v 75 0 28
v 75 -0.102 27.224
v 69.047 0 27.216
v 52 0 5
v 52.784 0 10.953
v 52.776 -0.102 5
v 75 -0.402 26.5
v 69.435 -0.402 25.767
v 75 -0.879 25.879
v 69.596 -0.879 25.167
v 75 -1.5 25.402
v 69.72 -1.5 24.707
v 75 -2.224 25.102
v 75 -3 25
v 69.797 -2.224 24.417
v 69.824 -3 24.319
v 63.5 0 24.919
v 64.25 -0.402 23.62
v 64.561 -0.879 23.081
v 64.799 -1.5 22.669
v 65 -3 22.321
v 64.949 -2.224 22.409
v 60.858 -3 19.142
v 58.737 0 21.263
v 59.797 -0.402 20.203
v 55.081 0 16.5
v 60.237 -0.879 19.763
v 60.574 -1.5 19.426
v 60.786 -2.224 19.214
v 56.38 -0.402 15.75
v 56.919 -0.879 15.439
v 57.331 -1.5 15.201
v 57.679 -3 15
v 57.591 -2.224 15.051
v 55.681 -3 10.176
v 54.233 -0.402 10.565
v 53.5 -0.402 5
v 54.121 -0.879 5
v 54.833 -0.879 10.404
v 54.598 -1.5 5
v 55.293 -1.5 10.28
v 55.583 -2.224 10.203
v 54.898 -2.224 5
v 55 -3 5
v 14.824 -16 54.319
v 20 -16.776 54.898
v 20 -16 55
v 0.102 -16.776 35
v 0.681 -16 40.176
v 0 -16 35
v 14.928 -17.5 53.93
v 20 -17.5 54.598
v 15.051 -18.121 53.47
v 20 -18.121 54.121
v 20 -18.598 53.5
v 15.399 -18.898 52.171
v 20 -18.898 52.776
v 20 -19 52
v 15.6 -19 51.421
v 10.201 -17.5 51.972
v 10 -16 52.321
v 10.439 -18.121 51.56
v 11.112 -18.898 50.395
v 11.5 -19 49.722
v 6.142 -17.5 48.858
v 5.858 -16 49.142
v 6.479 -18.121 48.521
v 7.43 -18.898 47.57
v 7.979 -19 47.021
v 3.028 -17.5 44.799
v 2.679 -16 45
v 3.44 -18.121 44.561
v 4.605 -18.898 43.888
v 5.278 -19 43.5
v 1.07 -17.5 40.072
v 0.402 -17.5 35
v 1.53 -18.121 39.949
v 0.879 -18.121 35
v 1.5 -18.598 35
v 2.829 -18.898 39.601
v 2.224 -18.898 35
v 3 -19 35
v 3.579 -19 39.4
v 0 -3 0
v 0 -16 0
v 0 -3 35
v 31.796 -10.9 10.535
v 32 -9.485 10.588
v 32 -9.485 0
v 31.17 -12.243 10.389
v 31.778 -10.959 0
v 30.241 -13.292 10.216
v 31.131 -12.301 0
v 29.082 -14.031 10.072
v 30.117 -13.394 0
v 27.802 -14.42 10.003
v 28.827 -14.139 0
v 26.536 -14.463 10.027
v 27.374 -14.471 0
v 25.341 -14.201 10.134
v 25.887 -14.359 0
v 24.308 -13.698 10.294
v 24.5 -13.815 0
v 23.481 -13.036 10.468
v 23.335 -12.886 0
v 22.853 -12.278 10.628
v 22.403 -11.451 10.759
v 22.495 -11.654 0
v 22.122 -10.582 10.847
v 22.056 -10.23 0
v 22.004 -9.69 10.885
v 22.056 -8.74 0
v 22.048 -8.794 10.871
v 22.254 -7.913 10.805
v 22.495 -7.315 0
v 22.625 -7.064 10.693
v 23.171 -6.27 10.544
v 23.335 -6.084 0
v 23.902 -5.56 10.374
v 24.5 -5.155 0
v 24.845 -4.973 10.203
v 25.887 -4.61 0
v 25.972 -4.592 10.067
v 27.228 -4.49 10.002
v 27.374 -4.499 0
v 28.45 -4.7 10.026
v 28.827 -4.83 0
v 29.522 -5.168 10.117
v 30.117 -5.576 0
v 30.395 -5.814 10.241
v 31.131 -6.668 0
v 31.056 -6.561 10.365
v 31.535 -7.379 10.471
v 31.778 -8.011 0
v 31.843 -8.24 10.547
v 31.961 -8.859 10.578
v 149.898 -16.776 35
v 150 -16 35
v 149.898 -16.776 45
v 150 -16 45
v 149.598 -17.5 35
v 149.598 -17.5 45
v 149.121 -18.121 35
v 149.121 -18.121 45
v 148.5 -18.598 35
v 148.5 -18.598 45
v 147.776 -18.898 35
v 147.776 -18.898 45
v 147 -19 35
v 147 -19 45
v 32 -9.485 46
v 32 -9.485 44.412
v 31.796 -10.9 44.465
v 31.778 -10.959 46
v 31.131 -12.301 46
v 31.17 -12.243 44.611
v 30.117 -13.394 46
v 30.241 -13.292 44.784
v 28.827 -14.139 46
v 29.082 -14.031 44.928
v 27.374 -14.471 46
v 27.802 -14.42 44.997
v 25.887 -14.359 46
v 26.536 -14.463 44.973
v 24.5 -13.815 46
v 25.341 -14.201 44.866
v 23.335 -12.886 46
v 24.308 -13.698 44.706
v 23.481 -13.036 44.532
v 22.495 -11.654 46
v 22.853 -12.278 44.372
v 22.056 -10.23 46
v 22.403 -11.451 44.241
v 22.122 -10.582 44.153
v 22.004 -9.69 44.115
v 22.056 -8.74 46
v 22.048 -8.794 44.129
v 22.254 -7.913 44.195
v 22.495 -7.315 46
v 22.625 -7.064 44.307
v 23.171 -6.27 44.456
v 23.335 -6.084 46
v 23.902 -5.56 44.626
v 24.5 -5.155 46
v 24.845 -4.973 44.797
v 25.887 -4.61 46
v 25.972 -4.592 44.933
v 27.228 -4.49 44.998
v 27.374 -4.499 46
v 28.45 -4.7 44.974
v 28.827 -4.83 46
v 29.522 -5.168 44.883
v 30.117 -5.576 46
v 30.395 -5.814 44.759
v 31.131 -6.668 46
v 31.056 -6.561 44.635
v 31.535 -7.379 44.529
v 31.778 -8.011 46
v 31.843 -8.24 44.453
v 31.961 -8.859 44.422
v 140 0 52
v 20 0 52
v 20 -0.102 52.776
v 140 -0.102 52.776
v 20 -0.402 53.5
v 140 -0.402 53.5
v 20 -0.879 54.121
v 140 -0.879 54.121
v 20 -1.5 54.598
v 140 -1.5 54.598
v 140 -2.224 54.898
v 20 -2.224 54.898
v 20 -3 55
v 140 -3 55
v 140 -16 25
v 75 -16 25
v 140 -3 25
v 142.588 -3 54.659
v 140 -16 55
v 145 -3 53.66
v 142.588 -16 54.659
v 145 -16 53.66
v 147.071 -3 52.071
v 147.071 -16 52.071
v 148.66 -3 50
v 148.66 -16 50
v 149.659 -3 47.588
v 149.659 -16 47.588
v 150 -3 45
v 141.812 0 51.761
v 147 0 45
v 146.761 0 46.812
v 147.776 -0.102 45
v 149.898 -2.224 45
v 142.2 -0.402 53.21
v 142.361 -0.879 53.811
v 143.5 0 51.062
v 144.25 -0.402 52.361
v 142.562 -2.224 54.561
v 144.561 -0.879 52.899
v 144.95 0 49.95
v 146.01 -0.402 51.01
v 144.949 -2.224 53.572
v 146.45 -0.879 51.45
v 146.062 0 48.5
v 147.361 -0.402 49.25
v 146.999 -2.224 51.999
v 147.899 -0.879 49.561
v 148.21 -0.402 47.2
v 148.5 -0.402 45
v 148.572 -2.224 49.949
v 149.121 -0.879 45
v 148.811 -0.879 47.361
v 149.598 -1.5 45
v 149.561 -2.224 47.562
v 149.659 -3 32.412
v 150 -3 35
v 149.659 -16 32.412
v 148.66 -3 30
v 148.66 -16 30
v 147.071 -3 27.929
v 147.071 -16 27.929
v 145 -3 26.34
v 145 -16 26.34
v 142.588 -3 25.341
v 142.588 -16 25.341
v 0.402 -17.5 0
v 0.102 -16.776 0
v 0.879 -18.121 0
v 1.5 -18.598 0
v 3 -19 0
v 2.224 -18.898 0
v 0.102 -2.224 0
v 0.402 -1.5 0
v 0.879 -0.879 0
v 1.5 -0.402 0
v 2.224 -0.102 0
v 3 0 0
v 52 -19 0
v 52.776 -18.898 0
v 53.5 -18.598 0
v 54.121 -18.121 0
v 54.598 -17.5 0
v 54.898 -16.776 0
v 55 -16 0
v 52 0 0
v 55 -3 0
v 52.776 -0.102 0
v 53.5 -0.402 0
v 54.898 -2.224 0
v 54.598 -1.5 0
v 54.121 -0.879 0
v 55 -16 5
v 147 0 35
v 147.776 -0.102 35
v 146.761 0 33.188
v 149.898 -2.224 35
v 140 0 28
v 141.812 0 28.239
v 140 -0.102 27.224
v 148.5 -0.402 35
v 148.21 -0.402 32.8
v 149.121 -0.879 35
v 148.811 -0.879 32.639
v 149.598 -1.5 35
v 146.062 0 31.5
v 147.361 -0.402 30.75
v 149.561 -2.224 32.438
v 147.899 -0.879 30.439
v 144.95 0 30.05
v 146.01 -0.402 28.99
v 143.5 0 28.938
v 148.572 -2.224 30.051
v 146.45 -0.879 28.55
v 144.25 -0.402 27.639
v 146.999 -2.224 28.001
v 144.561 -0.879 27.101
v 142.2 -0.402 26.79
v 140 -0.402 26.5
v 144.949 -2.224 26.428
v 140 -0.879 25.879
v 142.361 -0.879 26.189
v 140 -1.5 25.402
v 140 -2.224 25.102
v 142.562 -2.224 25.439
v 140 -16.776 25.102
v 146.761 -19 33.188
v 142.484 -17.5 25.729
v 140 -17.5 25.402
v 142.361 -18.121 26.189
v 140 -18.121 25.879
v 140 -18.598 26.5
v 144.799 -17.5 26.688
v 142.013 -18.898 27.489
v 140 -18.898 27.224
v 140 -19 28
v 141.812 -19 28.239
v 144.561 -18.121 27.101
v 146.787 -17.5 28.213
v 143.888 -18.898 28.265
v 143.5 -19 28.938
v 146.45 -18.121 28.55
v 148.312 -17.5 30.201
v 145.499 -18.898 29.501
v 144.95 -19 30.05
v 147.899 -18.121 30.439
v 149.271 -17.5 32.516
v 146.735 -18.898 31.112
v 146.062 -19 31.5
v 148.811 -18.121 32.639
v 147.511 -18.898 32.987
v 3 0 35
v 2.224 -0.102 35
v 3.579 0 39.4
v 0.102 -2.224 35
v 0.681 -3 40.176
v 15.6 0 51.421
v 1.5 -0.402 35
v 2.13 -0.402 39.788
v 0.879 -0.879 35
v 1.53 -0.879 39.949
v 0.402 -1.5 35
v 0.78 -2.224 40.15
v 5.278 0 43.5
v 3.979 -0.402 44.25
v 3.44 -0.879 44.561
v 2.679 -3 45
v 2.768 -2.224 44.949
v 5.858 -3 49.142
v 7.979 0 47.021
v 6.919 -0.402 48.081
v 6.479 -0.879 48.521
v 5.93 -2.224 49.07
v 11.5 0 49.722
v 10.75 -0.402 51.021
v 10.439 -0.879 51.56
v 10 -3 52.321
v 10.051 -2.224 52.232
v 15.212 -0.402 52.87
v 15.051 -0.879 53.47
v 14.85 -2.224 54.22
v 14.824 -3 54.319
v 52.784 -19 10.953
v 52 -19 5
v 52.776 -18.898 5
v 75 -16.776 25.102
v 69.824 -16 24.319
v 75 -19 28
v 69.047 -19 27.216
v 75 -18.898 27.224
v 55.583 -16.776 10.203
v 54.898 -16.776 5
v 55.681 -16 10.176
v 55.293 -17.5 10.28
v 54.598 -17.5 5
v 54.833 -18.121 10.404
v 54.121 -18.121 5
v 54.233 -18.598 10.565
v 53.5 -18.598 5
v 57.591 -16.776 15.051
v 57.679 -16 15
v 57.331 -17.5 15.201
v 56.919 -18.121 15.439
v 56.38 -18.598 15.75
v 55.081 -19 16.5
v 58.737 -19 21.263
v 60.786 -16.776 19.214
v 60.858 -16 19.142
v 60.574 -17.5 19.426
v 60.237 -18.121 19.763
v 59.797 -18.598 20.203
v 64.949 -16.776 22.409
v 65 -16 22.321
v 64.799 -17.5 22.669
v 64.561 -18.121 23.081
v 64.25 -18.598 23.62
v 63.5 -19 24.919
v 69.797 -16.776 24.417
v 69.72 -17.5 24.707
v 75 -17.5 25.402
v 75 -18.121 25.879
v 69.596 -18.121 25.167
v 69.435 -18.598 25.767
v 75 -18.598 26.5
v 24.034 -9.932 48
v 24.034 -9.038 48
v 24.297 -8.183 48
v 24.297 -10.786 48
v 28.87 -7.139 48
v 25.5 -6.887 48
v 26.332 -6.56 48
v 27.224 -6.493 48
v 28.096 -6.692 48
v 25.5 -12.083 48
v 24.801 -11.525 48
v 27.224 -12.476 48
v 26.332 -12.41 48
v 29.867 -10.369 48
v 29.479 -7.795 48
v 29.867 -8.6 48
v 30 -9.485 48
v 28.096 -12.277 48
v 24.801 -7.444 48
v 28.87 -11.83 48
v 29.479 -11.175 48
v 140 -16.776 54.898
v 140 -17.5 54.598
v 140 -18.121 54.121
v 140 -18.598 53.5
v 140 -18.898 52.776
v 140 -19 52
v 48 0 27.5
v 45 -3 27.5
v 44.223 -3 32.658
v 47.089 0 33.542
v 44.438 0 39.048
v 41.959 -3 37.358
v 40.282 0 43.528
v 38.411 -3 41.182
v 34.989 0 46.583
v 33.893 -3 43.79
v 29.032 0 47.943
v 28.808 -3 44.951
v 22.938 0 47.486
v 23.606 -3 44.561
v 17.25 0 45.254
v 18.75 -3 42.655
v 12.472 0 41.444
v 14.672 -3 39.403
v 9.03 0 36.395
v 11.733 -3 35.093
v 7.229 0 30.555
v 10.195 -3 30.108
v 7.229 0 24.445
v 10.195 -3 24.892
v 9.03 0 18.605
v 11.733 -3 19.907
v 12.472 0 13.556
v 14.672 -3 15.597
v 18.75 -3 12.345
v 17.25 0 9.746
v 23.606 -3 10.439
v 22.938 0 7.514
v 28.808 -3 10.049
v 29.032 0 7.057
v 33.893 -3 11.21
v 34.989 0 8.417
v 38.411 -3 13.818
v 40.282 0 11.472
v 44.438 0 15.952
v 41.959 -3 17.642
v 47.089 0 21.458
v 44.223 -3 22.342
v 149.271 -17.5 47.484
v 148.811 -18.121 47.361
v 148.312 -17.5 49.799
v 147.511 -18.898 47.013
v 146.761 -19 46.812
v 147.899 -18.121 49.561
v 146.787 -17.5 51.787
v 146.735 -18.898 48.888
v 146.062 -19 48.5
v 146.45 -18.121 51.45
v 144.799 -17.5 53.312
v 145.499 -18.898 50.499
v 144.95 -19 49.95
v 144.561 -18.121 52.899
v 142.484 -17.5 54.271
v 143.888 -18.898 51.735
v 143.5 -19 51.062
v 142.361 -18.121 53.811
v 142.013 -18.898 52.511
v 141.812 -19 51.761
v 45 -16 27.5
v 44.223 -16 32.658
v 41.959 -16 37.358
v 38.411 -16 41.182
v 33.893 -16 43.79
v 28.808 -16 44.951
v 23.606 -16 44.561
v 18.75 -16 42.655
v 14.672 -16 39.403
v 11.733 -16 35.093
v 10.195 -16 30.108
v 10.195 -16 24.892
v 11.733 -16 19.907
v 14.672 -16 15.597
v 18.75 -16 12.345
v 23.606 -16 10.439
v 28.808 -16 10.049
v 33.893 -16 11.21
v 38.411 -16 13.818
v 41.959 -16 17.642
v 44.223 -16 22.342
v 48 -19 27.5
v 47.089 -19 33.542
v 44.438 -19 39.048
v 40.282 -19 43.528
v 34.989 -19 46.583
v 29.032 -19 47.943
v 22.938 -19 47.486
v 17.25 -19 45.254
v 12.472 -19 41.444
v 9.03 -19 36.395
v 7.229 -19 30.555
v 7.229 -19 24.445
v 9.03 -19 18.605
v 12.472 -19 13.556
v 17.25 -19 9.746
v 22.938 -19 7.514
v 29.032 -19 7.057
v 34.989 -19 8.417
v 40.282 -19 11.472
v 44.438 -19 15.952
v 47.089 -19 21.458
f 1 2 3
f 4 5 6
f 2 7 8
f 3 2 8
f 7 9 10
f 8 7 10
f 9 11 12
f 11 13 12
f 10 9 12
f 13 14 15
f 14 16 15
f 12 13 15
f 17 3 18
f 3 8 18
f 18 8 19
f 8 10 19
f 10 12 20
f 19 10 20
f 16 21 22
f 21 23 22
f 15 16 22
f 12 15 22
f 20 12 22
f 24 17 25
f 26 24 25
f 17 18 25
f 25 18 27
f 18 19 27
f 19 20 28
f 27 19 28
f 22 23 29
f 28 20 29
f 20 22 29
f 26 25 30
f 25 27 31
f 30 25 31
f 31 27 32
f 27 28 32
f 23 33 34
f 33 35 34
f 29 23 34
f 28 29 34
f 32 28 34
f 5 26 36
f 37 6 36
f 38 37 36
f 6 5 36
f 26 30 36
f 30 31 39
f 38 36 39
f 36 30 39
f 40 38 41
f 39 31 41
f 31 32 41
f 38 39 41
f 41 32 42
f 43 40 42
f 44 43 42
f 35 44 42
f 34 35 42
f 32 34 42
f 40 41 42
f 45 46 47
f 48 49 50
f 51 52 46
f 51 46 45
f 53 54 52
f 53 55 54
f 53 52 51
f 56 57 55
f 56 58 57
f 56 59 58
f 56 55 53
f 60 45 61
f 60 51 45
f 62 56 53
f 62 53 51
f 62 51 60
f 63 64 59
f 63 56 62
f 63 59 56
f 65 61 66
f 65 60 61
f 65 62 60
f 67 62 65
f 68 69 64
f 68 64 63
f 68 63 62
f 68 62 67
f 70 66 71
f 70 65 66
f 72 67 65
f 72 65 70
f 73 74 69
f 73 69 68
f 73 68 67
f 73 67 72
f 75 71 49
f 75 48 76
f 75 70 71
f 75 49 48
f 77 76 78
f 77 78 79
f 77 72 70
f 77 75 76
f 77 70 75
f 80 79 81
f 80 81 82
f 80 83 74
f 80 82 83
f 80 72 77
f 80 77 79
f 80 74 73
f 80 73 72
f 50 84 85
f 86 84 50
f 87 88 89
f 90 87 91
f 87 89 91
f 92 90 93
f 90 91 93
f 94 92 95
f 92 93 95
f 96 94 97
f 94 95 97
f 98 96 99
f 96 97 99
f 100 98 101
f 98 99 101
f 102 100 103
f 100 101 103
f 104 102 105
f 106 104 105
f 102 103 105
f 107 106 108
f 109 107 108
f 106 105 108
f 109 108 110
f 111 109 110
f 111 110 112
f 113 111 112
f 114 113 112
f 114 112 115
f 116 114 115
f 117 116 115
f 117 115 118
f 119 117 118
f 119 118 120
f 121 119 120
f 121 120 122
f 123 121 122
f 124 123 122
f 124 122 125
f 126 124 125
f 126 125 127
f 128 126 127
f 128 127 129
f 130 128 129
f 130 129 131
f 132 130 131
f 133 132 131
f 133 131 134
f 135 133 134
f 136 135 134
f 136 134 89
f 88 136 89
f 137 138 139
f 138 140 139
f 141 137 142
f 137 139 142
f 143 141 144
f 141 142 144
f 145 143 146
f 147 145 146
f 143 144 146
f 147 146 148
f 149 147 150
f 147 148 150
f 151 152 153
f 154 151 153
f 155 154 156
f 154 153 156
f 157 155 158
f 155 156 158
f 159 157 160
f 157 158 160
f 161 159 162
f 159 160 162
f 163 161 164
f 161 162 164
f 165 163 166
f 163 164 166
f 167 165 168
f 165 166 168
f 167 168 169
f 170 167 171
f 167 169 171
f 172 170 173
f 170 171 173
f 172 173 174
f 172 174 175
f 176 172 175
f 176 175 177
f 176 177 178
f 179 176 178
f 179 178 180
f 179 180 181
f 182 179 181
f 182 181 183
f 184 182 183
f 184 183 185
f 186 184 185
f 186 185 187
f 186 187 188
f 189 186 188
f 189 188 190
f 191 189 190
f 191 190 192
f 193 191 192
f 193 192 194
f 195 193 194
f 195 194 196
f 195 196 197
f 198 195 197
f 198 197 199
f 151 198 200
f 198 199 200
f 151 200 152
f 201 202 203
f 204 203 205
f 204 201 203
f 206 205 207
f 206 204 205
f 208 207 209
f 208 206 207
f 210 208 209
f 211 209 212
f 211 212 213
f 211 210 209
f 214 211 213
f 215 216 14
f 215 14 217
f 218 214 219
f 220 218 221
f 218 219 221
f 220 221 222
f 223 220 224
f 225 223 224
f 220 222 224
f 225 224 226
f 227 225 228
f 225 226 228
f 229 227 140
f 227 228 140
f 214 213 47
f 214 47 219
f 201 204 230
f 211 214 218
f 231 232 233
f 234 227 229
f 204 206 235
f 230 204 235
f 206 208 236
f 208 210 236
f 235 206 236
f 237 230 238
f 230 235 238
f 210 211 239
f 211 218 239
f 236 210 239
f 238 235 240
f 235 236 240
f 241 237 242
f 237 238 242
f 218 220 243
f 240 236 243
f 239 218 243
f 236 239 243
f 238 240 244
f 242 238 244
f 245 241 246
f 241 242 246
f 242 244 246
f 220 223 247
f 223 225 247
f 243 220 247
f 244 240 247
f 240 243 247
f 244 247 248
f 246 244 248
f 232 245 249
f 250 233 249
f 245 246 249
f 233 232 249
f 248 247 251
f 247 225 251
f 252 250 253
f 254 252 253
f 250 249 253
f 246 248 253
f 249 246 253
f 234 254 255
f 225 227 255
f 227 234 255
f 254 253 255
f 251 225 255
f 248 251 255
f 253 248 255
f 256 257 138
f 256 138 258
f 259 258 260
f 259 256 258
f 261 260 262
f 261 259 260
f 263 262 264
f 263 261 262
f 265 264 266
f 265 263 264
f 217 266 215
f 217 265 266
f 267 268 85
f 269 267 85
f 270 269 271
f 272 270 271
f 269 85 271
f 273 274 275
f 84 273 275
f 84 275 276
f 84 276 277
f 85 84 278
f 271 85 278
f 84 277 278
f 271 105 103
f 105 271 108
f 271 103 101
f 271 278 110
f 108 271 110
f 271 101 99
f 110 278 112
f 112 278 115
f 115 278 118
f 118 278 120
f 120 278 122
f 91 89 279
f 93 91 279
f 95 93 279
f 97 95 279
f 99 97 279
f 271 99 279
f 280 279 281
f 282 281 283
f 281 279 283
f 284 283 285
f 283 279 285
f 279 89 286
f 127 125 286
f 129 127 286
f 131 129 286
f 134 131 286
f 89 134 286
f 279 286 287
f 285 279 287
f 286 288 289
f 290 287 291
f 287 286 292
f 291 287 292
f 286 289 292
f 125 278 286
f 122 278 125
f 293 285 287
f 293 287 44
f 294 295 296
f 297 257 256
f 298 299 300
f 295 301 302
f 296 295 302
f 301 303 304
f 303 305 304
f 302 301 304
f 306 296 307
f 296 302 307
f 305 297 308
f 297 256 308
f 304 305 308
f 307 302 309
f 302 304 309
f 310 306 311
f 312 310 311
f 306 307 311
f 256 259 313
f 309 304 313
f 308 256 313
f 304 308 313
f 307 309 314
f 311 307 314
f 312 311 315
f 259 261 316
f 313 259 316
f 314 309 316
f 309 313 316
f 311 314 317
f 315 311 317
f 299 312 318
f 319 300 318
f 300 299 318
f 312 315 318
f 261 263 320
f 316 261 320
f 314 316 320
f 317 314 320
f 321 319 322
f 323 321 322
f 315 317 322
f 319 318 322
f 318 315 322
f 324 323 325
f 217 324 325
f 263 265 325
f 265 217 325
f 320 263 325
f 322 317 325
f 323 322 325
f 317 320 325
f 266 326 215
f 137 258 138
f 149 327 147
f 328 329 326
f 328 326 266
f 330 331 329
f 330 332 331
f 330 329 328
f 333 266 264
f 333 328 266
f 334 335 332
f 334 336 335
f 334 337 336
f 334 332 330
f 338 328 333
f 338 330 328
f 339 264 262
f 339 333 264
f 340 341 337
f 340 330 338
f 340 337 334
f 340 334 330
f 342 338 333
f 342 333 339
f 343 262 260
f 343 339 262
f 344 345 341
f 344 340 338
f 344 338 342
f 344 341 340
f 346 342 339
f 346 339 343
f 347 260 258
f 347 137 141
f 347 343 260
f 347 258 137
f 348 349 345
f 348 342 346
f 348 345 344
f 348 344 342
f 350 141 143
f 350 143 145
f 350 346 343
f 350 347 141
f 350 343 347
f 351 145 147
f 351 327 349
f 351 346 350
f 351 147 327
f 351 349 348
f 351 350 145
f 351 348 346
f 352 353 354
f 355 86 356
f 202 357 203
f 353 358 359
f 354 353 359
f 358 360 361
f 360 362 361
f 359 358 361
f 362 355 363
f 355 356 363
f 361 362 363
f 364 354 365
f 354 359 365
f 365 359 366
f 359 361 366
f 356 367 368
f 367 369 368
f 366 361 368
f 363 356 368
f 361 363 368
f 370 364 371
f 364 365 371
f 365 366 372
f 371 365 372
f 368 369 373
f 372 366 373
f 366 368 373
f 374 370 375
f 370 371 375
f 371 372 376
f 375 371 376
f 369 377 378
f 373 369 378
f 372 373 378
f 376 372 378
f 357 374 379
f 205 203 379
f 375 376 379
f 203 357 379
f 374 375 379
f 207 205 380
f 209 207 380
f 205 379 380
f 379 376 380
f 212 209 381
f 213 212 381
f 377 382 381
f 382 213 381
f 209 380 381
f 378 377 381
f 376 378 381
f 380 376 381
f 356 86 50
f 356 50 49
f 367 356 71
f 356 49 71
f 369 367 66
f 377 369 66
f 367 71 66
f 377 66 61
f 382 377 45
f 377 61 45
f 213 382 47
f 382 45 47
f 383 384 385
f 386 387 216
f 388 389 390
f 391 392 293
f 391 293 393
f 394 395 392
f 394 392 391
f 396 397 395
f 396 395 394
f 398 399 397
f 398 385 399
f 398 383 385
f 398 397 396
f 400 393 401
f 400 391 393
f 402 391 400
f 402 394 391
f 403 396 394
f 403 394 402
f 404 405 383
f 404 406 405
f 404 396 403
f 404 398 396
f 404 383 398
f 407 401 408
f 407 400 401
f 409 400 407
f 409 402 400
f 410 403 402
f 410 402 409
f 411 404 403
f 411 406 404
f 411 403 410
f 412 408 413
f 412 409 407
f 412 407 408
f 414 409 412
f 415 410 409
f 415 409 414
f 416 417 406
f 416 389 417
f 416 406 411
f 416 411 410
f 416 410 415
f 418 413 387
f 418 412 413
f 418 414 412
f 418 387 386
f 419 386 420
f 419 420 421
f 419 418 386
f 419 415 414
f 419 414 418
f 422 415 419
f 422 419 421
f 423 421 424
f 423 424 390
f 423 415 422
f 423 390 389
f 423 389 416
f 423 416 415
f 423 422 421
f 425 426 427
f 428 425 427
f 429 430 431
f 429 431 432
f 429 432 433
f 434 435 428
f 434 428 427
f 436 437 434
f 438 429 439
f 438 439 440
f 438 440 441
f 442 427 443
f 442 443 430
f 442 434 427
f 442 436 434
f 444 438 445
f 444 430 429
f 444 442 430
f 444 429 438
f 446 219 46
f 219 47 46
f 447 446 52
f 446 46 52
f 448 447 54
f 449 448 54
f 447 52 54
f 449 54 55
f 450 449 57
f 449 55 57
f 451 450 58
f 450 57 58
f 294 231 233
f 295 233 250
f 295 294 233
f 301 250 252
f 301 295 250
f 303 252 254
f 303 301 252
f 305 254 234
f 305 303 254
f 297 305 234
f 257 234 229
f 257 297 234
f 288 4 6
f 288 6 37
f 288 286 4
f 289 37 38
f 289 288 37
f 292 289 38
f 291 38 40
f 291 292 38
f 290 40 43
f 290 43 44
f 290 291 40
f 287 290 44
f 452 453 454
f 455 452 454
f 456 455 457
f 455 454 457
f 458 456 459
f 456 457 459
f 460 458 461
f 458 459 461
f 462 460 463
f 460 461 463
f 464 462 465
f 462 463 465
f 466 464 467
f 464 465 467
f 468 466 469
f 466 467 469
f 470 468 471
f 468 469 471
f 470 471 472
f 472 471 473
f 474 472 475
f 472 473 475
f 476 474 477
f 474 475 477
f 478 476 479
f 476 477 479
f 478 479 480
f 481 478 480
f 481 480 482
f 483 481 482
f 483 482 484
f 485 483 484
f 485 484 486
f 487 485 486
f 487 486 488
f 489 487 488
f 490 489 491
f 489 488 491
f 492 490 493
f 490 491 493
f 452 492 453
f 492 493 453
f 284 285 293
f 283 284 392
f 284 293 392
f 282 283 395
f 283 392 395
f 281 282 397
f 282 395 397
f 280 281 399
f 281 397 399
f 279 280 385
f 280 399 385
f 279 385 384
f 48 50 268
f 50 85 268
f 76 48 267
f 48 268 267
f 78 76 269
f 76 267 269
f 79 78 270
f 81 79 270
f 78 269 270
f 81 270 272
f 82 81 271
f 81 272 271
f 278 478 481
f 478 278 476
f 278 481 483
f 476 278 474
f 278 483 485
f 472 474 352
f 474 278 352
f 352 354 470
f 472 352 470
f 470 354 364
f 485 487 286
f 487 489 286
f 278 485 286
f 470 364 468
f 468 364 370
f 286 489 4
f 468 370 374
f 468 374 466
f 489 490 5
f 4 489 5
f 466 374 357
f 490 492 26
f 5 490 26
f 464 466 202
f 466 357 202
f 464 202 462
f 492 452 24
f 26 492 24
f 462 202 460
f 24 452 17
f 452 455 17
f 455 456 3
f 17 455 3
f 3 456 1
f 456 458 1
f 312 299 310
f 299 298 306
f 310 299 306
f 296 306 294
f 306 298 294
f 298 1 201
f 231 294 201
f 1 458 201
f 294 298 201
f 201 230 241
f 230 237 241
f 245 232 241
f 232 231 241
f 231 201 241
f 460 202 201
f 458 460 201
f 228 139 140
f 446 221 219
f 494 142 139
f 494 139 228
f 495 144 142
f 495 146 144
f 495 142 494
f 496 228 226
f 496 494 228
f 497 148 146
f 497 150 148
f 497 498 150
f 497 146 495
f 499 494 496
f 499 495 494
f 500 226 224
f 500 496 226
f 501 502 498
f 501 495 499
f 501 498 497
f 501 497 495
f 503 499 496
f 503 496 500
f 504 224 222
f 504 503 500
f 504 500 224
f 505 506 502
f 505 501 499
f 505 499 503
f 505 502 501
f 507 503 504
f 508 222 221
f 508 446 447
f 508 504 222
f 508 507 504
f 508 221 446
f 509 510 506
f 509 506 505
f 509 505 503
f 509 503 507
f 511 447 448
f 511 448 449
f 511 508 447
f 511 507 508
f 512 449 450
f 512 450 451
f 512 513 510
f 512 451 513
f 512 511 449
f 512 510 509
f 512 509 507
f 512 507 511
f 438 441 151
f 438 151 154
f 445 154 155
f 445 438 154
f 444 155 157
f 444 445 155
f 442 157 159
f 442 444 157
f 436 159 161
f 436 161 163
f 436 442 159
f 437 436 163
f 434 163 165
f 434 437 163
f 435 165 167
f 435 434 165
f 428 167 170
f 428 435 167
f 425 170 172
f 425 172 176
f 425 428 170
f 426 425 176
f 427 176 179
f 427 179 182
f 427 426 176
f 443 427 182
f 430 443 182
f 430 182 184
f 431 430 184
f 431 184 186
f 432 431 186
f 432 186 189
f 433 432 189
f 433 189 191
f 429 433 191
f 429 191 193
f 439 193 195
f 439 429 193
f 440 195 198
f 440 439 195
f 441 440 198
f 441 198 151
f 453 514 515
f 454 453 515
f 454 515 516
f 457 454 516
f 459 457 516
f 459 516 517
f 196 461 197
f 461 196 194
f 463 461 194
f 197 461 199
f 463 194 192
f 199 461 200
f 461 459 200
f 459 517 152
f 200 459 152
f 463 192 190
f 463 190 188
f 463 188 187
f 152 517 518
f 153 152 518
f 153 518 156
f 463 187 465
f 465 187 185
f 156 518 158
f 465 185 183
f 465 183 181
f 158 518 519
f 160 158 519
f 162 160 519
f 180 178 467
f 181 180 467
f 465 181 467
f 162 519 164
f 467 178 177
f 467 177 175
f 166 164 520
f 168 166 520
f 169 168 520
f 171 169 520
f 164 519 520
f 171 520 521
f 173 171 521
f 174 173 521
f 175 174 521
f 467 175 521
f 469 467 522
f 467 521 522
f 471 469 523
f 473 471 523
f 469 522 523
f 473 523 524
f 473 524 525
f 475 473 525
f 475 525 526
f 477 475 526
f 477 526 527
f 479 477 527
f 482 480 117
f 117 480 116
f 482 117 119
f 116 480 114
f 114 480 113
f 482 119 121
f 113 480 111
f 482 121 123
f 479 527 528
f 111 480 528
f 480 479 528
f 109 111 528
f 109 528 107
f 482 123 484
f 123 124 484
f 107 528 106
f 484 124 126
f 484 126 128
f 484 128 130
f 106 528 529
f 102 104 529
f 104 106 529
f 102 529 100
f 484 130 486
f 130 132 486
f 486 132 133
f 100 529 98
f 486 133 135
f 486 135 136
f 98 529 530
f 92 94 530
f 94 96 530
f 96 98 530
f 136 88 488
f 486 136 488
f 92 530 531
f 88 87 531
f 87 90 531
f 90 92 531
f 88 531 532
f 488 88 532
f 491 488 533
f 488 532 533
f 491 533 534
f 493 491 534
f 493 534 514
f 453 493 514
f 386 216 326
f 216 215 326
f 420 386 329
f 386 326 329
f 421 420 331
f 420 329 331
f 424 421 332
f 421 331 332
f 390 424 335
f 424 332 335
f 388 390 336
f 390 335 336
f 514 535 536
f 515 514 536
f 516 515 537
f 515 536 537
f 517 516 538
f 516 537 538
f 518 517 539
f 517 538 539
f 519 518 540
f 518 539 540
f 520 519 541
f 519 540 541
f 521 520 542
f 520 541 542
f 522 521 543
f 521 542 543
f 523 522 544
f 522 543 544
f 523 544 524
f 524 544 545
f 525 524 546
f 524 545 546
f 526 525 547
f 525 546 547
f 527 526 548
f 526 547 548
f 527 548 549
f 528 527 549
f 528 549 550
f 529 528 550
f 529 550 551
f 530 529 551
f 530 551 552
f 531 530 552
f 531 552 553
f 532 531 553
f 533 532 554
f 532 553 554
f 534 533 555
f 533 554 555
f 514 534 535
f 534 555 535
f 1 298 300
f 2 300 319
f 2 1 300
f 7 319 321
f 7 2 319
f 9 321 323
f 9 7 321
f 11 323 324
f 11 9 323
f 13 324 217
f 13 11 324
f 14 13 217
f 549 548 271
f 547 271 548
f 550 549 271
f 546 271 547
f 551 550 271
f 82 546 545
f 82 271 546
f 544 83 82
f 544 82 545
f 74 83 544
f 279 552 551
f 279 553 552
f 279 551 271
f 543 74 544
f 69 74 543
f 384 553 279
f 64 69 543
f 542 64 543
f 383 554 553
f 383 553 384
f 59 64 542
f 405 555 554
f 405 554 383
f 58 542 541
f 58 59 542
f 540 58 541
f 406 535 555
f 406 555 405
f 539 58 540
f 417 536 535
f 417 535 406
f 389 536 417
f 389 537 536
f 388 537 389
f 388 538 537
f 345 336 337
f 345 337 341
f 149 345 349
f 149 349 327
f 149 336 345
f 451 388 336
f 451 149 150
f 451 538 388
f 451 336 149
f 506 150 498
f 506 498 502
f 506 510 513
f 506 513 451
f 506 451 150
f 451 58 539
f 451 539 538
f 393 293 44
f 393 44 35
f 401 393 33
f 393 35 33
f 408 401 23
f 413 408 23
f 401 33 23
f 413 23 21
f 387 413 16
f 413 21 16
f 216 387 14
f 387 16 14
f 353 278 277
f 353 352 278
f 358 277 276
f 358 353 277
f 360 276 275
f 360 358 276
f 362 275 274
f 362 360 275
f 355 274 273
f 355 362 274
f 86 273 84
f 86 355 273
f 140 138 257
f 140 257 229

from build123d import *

# Parameters (mm, degrees)
F0_W      = 150
F0_H      = 55
F1_DEPTH  = 19
F2_R      = 17.5
F3_DEPTH  = 19.001
F4_W      = 95
F4_H      = 25
F5_DEPTH  = 19.001
F6_R      = 20
F7_R      = 10
F8_R      = 3
F9_R      = 5
F10_DEPTH = 48
F11_SIZE  = 3
F12_SIZE  = 2


with BuildPart() as f1:
    # F0 (on Front) → F1 (new body)
    with BuildSketch(Plane.XZ):
        with Locations((75, 27.5)):
            Rectangle(F0_W, F0_H)
    extrude(amount=F1_DEPTH)

    # F2 (on face) → F3 (cut, through all)
    with BuildSketch(Plane.XZ.offset(19)):
        with Locations((27.5, 27.5)):
            Circle(F2_R)
    extrude(amount=-F3_DEPTH, mode=Mode.SUBTRACT)

    # F4 (on face) → F5 (cut, through all)
    with BuildSketch(Plane.XZ.offset(19)):
        with Locations((102.5, 12.5)):
            Rectangle(F4_W, F4_H)
    extrude(amount=-F5_DEPTH, mode=Mode.SUBTRACT)

    # F6
    f6_edges = [f1.edges().sort_by_distance(p)[0] for p in [
        (55, -9.5, 25),
        (0, -9.5, 55),
    ]]
    fillet(f6_edges, radius=F6_R)

    # F7
    f7_edges = [f1.edges().sort_by_distance(p)[0] for p in [
        (150, -9.5, 25),
        (150, -9.5, 55),
    ]]
    fillet(f7_edges, radius=F7_R)

    # F8
    f8_edges = [f1.edges().sort_by_distance(p)[0] for p in [
        (107.5, -19, 25),
        (80, 0, 55),
    ]]
    fillet(f8_edges, radius=F8_R)

    # F9 (on face) → F10 (cut)
    with BuildSketch(Plane(origin=(0, 0, 0), x_dir=(1, 0, 0), z_dir=(0, 0, -1))):
        with Locations((26.9999956992, 9.4847604468)):
            Circle(F9_R)
    extrude(amount=-F10_DEPTH, mode=Mode.SUBTRACT)

    # F11
    f11_edges = [f1.edges().sort_by_distance(p)[0] for p in [
        (10, -19, 27.5),
        (10, 0, 27.5),
    ]]
    chamfer(f11_edges, length=F11_SIZE)

    # F12
    f12_edges = [f1.edges().sort_by_distance(p)[0] for p in [
        (21.999996, -9.48476, 48),
    ]]
    chamfer(f12_edges, length=F12_SIZE)


solid = f1.part
